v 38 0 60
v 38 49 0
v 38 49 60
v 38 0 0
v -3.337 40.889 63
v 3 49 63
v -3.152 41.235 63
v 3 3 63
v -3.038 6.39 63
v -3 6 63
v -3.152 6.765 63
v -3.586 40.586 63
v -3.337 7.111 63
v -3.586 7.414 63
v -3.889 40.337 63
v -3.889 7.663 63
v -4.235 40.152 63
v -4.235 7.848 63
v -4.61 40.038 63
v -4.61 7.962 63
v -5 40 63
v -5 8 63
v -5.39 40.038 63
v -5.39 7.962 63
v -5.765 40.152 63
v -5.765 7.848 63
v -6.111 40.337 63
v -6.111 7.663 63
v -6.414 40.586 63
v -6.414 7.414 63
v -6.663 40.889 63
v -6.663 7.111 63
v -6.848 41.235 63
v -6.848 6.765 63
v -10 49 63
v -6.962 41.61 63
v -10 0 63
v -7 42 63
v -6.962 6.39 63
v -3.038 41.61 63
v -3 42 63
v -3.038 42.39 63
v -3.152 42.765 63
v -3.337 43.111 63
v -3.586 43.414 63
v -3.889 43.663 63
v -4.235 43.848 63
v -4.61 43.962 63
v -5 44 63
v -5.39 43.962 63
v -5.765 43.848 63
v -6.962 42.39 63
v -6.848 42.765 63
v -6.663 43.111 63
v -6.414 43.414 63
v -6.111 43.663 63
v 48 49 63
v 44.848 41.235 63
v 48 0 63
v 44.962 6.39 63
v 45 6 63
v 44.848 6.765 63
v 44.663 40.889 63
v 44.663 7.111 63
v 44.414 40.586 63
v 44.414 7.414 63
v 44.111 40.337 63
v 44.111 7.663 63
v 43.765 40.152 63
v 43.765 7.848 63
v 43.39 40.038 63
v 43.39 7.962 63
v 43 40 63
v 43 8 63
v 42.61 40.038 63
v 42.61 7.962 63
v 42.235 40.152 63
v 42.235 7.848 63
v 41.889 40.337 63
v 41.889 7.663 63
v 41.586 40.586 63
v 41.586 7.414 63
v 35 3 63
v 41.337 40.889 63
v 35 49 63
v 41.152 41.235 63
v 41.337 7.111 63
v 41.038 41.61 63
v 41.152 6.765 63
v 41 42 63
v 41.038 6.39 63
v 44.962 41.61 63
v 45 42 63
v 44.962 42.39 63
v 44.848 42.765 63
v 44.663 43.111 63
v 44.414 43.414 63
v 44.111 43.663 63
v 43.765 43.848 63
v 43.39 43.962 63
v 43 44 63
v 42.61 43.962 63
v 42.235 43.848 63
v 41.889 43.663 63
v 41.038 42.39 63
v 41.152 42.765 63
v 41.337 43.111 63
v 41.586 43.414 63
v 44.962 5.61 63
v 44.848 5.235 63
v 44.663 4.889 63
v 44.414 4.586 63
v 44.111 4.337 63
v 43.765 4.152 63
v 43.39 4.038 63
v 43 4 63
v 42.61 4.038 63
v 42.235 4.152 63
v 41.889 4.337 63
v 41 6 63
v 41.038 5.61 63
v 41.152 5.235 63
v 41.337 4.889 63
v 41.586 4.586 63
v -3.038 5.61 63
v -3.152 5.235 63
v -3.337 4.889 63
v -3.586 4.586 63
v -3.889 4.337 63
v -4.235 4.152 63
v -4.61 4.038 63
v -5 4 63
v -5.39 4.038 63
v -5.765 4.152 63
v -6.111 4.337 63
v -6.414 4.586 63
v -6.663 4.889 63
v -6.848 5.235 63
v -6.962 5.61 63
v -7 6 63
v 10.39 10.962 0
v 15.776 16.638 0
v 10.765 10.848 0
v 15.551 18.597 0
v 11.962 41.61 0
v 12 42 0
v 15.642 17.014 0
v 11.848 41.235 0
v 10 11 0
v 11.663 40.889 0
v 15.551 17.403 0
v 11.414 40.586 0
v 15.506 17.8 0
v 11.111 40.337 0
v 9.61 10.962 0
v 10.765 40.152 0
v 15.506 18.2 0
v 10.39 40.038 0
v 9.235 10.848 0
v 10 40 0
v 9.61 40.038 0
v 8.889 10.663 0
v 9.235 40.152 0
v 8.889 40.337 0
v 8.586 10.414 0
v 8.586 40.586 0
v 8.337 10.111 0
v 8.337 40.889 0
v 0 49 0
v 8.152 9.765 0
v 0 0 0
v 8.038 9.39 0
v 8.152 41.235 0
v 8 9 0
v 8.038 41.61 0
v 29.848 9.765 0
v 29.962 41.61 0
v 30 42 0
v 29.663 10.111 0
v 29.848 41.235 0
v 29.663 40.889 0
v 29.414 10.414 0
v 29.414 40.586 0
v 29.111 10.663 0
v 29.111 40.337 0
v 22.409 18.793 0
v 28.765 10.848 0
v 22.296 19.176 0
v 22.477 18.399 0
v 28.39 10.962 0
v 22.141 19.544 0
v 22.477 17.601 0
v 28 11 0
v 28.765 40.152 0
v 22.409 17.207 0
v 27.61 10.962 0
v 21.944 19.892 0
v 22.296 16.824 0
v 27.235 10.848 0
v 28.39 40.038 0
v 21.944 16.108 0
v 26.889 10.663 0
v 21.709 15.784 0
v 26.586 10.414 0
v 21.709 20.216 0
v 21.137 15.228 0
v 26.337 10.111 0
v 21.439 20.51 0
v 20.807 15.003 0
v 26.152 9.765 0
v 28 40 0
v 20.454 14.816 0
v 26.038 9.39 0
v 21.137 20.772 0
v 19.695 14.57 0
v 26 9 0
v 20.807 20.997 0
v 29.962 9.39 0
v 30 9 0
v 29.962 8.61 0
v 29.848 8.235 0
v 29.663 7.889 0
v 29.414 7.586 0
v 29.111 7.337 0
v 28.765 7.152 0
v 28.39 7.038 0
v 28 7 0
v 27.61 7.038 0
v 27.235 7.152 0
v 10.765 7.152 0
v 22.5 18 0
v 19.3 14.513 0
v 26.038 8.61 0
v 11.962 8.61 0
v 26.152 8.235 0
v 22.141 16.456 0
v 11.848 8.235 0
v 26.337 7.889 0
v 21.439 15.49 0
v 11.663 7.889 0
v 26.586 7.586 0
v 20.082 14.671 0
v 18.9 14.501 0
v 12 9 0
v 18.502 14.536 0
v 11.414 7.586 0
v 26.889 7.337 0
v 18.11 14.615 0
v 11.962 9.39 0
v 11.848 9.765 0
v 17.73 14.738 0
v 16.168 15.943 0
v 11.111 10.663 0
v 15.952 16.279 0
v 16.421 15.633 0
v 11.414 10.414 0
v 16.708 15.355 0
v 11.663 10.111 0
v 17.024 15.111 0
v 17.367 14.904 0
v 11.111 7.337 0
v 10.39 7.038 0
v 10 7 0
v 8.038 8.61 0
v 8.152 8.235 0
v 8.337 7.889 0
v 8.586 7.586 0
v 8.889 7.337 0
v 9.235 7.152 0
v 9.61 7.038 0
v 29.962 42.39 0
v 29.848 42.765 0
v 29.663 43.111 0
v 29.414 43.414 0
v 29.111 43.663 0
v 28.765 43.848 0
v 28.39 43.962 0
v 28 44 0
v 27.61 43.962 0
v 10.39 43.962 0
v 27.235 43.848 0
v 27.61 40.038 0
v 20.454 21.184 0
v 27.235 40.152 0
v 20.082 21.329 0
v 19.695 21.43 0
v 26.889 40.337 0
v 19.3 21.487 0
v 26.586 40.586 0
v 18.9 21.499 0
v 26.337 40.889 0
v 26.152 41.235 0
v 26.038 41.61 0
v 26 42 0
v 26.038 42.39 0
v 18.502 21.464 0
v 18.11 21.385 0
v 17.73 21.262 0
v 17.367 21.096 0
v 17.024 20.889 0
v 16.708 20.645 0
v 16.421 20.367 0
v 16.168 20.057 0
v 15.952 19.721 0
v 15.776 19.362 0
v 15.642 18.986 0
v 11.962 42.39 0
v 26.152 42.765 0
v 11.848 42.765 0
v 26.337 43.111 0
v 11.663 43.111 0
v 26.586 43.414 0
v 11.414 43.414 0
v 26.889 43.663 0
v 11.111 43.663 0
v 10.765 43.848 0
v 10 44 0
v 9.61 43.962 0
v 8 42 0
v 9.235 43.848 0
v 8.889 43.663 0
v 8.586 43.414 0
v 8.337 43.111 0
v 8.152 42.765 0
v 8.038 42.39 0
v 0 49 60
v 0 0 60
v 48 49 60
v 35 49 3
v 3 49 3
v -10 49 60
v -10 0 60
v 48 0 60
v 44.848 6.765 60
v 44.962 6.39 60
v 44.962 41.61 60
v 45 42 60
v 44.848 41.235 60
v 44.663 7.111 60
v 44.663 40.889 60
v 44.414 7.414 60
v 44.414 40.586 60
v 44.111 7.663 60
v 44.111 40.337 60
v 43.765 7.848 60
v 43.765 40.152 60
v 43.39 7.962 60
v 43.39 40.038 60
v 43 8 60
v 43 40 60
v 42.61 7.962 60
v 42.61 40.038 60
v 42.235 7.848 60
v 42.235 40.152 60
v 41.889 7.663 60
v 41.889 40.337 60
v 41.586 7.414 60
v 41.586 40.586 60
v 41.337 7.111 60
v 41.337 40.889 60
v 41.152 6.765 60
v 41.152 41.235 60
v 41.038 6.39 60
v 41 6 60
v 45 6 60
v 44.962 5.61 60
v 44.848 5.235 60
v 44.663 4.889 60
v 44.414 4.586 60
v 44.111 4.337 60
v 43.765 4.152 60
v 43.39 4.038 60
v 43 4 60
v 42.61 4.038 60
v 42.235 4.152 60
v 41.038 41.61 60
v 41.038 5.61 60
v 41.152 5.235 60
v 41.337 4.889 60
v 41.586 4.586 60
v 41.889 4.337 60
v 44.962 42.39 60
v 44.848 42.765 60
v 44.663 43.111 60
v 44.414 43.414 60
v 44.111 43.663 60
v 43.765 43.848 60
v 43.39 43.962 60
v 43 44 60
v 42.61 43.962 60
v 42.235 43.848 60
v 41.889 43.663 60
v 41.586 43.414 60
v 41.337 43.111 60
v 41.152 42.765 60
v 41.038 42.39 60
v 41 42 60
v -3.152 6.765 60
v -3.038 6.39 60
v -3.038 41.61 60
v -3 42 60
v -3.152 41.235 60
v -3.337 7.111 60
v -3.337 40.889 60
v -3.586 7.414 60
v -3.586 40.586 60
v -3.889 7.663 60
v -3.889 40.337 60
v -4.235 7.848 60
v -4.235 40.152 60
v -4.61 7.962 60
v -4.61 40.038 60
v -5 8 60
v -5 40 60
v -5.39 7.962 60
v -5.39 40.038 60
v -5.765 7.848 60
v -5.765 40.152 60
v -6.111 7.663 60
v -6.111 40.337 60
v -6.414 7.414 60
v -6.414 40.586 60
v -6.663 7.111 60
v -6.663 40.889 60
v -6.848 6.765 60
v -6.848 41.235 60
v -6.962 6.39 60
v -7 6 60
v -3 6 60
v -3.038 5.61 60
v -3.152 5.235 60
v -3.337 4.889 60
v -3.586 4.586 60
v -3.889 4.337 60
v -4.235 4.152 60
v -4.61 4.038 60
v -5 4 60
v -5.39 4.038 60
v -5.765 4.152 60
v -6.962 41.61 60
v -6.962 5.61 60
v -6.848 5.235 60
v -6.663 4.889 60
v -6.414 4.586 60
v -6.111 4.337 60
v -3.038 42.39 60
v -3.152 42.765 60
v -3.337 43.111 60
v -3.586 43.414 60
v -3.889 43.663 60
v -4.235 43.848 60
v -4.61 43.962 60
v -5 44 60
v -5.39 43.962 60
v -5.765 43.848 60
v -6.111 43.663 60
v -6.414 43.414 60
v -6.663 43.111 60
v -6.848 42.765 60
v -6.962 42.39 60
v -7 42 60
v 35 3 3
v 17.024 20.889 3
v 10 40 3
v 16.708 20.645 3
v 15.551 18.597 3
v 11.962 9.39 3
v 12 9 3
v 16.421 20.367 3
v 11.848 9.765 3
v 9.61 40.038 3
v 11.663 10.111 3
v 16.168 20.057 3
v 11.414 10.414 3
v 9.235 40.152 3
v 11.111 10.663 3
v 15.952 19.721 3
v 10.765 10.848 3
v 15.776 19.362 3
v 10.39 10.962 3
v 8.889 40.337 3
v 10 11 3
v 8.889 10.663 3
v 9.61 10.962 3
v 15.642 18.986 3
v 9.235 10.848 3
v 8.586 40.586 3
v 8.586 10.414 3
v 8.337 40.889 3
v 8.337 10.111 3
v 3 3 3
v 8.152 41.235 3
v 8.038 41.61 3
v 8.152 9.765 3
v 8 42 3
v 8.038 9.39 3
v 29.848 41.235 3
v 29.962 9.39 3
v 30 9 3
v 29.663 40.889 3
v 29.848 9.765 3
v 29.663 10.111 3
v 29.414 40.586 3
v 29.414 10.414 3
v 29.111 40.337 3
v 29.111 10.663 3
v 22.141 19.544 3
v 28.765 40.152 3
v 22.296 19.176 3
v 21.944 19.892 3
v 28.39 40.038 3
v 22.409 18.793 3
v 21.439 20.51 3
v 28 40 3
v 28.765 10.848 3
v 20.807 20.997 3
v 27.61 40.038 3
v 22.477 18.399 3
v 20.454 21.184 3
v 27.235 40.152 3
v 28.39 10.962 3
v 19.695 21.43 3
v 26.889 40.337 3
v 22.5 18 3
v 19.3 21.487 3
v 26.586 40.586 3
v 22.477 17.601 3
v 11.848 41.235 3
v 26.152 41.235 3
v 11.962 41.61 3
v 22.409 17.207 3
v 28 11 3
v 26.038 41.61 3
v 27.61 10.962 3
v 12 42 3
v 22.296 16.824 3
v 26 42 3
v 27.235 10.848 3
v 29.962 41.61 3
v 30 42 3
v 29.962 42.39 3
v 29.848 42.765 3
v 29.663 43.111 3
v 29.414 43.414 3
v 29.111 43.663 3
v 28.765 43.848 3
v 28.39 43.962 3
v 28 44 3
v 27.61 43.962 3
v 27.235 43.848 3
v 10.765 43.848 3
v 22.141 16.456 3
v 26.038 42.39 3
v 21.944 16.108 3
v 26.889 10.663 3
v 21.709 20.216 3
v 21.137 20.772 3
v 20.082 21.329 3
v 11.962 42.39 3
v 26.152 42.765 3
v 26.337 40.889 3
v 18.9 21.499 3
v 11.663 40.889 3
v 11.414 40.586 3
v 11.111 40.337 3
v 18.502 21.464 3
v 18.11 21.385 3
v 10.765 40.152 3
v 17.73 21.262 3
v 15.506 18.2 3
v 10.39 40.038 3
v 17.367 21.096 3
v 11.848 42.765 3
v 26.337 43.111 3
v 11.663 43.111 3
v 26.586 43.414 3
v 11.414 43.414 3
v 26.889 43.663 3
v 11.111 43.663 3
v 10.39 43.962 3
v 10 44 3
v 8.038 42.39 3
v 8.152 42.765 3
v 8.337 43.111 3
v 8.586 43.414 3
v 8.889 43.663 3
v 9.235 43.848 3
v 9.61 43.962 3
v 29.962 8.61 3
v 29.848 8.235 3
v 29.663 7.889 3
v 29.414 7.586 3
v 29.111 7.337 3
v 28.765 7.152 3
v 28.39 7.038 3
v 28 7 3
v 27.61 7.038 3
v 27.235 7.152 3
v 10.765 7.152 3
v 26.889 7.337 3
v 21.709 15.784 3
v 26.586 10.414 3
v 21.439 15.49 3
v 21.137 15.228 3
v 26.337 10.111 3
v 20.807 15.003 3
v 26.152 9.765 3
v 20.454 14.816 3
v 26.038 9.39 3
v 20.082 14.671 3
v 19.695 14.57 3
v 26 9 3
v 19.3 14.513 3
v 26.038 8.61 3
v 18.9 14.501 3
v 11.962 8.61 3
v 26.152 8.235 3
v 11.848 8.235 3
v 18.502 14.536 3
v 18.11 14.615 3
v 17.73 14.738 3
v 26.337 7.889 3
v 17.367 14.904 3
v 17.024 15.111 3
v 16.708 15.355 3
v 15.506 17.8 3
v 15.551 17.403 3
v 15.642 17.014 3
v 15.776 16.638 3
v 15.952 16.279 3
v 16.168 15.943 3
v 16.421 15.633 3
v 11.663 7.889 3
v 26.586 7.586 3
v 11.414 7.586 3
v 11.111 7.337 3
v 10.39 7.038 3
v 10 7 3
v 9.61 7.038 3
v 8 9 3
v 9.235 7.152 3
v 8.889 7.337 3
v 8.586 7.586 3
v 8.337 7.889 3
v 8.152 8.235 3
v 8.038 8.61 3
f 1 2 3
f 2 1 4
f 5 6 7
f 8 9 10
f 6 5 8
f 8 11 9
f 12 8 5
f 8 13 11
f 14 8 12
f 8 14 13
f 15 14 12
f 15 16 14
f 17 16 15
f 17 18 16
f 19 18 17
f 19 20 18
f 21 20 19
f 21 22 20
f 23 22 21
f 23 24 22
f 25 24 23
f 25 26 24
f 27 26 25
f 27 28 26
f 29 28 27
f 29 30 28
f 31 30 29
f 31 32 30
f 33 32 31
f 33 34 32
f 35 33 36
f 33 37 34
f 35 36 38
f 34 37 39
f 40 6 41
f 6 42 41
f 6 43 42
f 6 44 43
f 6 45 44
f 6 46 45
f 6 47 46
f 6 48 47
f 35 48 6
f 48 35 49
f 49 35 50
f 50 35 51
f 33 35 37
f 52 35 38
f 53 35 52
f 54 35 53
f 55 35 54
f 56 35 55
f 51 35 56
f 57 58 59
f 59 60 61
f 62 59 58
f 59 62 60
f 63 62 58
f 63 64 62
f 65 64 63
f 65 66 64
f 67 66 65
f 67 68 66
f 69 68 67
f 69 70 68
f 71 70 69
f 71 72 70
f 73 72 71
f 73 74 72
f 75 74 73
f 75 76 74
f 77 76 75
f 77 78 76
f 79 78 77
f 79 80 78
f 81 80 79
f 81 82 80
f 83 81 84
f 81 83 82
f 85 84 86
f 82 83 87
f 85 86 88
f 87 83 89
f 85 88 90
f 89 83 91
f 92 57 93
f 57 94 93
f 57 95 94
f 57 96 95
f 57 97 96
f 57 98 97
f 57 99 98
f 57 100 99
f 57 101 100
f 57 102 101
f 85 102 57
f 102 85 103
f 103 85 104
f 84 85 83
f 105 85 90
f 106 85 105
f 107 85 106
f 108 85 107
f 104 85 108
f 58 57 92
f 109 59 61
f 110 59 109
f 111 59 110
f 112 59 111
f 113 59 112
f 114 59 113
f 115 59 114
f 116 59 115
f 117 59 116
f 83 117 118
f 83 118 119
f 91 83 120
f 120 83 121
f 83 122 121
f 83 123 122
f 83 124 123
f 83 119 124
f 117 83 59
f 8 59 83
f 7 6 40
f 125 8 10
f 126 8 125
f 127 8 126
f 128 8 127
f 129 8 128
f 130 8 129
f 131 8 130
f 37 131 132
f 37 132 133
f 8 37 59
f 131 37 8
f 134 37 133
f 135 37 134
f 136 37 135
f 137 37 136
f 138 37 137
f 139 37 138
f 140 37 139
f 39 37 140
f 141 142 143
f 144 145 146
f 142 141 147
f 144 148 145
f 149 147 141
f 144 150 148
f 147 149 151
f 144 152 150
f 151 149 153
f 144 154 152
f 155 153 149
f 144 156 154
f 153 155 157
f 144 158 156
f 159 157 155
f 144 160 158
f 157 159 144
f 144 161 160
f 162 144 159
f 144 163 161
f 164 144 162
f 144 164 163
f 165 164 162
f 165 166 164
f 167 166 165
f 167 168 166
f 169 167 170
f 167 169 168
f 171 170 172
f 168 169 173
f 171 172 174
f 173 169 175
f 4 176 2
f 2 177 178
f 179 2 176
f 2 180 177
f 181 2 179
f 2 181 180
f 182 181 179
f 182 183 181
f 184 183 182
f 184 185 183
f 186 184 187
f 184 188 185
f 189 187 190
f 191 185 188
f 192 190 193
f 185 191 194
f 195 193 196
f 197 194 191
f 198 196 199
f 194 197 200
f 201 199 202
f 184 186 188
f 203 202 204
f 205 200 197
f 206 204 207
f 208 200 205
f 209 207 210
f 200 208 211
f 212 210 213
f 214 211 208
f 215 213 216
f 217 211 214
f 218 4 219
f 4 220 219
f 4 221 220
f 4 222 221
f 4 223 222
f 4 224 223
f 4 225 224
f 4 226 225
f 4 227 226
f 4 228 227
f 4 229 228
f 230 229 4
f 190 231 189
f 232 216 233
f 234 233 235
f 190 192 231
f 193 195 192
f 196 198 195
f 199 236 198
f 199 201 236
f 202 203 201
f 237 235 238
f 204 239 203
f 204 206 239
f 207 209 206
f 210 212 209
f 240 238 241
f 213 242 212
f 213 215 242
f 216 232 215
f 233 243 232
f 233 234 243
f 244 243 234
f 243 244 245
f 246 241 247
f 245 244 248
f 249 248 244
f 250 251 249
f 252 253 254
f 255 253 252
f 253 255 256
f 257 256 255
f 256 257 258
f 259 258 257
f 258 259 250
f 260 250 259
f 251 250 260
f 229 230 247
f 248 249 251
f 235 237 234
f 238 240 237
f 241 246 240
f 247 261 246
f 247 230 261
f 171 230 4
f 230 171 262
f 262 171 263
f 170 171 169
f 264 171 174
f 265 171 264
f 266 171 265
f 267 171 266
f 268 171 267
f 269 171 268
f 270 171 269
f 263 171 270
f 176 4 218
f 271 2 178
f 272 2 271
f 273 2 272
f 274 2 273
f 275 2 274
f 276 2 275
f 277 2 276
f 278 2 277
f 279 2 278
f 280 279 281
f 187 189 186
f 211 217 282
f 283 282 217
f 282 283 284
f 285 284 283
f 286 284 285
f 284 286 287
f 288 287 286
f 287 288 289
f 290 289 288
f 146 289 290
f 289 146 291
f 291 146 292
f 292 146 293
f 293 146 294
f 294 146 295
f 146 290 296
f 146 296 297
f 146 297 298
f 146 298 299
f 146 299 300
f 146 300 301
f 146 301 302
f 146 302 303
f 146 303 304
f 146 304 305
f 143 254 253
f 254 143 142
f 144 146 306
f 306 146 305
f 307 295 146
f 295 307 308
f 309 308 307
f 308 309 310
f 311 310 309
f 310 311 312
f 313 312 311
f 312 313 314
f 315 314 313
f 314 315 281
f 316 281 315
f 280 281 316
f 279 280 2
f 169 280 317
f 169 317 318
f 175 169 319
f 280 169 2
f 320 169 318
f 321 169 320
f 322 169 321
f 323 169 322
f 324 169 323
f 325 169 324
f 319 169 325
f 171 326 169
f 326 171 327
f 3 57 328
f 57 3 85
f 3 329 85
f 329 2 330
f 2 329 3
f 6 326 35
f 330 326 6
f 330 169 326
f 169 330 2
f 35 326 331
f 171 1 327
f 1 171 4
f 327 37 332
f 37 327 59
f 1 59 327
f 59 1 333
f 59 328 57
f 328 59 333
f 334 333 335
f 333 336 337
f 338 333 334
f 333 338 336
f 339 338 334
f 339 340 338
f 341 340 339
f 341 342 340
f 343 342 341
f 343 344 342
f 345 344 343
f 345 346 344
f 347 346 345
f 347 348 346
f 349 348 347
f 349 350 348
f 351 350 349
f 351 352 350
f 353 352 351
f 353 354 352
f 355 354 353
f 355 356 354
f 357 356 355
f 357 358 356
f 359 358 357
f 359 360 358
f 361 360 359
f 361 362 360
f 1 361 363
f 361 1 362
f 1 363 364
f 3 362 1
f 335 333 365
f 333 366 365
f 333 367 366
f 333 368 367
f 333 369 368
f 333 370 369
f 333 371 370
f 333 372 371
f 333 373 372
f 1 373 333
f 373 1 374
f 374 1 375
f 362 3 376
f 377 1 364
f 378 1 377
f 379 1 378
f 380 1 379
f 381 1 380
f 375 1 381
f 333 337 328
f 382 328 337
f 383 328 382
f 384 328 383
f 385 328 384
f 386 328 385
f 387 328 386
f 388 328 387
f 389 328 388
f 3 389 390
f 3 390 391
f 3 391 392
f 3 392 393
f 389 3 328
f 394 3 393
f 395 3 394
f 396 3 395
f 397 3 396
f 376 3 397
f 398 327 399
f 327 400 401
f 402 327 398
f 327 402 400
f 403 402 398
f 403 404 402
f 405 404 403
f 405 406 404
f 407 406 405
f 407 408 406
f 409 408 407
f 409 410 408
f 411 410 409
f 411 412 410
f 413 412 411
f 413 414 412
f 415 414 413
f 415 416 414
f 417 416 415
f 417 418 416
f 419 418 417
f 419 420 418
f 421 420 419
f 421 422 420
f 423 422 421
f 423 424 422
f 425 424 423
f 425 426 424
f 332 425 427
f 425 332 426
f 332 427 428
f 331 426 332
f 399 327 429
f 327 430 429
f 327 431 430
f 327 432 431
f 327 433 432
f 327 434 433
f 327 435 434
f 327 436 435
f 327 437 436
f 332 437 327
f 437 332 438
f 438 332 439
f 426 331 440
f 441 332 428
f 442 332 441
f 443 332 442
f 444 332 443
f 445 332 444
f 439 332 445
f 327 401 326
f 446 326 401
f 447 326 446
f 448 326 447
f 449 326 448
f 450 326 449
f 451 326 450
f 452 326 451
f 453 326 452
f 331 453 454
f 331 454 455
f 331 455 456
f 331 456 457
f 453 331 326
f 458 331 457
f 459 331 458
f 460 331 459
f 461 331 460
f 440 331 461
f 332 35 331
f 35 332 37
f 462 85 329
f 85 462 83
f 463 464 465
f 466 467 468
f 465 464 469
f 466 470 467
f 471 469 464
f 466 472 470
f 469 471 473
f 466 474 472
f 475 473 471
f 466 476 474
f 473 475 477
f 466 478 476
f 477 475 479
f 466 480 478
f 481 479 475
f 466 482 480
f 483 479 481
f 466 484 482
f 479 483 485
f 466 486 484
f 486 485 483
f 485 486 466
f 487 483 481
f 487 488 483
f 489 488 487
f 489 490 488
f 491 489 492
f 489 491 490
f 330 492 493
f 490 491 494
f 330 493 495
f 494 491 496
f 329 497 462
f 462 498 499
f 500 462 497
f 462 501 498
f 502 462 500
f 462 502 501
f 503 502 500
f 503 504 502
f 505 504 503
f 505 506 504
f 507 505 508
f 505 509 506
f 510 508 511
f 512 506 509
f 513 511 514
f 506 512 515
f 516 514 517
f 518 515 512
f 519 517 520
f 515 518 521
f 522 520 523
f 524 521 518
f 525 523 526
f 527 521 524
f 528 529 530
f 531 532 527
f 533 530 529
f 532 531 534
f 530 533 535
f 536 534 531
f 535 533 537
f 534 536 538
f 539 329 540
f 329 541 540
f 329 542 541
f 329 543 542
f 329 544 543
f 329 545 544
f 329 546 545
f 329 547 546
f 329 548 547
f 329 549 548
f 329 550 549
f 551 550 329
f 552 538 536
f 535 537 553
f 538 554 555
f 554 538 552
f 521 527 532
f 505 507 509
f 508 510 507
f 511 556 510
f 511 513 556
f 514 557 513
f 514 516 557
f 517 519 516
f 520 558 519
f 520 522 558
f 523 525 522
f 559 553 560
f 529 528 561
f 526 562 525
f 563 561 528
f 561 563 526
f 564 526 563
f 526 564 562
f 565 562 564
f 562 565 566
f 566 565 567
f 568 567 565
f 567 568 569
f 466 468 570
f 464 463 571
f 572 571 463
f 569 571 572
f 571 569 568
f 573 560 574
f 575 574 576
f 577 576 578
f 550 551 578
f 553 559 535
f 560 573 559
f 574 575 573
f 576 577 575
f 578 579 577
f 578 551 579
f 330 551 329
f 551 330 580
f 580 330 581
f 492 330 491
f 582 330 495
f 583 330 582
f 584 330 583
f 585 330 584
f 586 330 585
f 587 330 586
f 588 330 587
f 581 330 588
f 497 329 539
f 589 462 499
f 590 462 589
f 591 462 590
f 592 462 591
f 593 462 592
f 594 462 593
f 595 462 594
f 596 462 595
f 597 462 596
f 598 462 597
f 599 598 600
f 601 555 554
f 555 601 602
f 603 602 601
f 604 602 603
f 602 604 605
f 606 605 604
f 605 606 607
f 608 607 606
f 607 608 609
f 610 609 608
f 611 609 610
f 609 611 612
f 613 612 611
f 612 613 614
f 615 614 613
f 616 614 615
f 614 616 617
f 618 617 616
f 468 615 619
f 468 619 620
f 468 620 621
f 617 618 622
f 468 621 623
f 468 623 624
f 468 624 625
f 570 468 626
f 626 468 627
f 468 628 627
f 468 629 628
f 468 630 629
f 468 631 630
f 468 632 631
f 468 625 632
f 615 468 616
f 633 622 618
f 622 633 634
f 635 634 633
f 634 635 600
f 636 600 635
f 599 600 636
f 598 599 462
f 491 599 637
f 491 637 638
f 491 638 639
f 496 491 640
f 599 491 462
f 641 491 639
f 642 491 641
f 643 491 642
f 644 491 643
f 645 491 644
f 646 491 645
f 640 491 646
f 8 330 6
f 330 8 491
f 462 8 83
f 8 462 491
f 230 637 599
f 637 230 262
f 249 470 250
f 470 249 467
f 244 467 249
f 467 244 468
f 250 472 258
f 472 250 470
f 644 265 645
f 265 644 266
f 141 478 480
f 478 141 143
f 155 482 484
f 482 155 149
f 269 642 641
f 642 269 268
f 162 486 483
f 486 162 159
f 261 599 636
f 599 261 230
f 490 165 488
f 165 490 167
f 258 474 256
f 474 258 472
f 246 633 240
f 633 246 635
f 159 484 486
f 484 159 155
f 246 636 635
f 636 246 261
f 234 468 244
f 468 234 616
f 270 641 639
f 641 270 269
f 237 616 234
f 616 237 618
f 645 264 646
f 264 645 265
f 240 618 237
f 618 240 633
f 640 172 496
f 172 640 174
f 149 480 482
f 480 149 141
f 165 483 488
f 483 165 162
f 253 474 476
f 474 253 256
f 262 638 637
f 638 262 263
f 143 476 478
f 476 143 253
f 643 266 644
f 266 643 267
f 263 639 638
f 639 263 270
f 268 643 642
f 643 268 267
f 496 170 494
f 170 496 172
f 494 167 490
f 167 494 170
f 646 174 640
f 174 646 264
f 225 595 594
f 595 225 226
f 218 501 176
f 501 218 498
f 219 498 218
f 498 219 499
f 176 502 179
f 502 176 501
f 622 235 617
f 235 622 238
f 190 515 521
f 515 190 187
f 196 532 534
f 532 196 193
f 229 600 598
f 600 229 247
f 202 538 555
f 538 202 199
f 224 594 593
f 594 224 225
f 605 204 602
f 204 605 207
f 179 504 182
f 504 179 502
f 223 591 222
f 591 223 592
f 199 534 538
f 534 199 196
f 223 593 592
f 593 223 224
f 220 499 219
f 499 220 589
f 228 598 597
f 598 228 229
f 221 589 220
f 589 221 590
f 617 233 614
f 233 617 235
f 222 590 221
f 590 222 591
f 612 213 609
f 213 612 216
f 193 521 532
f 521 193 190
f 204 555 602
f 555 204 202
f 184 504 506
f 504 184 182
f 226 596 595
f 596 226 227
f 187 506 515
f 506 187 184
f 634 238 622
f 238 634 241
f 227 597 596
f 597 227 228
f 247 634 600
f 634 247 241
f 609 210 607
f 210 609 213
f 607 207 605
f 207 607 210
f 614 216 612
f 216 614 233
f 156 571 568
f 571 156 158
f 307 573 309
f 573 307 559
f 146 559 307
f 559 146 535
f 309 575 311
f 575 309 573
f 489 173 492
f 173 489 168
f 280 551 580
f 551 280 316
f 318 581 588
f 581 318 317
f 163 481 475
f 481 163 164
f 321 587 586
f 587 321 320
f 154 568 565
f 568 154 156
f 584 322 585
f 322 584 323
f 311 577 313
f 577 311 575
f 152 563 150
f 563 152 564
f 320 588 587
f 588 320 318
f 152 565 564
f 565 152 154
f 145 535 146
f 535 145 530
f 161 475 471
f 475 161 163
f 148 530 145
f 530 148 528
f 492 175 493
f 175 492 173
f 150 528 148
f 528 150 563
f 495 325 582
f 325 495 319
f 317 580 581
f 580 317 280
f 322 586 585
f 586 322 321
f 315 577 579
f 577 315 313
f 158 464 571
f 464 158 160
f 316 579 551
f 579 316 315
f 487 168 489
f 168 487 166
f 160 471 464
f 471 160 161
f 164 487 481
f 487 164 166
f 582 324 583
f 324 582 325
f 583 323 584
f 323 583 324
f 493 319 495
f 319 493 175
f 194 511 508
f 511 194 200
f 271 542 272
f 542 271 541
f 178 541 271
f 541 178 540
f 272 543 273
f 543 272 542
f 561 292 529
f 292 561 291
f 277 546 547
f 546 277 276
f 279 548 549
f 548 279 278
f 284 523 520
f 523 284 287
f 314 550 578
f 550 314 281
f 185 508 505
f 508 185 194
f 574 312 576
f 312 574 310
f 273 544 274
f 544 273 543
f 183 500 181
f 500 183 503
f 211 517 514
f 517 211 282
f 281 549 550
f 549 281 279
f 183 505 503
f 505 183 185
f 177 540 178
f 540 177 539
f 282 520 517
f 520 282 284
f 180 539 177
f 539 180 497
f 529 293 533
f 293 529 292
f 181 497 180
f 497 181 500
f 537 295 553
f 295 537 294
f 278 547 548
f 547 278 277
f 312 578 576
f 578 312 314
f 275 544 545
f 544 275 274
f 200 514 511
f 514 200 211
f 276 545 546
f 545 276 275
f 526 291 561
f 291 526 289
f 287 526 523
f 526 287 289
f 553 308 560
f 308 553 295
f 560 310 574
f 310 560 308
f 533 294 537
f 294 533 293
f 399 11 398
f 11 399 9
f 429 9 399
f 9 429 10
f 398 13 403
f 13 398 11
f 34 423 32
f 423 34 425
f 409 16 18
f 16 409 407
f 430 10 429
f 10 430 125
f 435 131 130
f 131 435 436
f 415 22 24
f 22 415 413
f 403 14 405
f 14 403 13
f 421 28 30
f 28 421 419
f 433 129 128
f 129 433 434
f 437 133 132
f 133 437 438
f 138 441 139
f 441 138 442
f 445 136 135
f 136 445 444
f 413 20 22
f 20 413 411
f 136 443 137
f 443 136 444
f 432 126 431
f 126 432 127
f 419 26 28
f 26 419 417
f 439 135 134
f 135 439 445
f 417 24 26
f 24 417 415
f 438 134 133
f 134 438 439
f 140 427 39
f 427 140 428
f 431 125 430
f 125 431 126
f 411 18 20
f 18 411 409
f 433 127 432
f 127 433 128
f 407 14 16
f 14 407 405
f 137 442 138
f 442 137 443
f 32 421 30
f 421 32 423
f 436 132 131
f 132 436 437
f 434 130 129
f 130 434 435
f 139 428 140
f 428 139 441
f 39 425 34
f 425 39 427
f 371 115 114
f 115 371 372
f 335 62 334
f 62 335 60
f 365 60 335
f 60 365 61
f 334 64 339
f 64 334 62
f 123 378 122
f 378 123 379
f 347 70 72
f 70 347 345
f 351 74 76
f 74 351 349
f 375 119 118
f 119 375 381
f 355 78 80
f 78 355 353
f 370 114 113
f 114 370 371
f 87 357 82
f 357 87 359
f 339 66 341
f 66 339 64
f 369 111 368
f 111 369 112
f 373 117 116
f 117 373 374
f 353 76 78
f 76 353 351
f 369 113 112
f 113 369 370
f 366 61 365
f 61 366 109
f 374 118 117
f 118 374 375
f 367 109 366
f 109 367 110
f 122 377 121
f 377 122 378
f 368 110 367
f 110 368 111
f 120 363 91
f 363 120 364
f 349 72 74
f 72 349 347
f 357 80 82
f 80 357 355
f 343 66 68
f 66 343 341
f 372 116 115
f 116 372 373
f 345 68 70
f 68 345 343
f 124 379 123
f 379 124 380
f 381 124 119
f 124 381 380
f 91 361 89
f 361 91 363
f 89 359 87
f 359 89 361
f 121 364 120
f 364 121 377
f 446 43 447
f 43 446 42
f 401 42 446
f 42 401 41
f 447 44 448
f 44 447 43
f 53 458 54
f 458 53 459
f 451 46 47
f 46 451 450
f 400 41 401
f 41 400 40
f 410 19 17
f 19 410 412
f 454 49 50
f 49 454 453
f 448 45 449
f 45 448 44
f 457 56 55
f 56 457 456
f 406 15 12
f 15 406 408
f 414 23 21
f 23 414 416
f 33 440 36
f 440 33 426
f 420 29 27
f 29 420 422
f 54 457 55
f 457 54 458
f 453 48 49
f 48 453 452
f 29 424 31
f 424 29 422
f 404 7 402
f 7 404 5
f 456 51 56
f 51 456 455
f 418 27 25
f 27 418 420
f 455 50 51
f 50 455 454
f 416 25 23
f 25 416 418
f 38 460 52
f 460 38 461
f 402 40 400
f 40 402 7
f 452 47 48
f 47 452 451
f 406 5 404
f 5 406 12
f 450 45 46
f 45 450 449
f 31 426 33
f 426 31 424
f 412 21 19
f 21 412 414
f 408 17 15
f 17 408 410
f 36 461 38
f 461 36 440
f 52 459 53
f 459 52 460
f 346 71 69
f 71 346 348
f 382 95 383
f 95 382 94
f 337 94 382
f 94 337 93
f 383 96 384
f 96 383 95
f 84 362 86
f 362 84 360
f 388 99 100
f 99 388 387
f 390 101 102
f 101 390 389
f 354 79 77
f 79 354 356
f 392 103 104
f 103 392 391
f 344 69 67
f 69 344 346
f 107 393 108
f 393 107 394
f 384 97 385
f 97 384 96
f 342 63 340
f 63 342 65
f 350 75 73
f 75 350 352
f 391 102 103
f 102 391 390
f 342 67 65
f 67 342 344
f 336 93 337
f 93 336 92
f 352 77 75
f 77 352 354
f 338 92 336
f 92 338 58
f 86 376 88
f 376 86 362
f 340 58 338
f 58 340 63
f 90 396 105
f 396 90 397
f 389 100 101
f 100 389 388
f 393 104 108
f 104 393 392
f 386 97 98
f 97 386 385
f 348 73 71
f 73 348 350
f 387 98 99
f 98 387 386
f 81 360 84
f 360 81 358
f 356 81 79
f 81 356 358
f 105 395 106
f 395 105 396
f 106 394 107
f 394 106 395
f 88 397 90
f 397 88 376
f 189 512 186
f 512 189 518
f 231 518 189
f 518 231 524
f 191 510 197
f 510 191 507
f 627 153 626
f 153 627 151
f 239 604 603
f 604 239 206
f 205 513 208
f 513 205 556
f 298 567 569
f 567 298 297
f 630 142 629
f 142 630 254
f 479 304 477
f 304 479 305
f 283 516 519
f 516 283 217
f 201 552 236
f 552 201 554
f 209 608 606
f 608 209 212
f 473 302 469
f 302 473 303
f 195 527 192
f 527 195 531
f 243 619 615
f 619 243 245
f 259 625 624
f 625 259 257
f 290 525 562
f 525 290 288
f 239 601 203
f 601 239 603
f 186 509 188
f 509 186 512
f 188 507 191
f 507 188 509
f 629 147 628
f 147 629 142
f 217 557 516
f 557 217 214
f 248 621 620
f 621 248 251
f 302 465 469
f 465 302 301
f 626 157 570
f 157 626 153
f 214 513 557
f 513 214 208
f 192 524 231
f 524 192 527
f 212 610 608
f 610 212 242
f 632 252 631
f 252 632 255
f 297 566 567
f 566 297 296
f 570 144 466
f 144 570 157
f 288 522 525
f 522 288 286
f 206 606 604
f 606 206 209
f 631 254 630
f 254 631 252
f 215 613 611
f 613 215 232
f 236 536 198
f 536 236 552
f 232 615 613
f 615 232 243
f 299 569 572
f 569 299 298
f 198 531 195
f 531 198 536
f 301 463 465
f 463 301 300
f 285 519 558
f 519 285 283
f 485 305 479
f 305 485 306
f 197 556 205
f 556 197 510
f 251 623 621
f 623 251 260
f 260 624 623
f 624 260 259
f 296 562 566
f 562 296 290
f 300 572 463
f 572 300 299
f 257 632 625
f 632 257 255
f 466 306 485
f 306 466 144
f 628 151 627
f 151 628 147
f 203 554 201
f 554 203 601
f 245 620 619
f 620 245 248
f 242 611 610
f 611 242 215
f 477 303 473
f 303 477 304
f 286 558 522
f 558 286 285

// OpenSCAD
//bracket for holder 90 degree motor
$fa = 1;
$fs = 0.4;

motor_width = 32; //x
motor_length = 46; //y
motor_height = 60; //z

frame = 3;
tollerance = 1;

outer_bracket_width = motor_width + frame*2; //x
outer_bracket_length = motor_length + frame; //y
outer_bracket_height = motor_height + frame; //z

lip = 10;

module screw_hole(x,y,z){
    translate([x,y,z-1])
        cylinder(h=5, d=4);
}

difference(){
    union(){
        cube([outer_bracket_width, outer_bracket_length, outer_bracket_height]);

        translate([-lip, 0, outer_bracket_height-frame])
            cube([outer_bracket_width+lip*2, outer_bracket_length, frame]);
    }
    translate([frame, frame, frame])
        cube([motor_width, motor_length+tollerance, motor_height+tollerance]);

    //Holes for attacing motor
    screw_hole(7+frame, 6+frame, 0);
    screw_hole(25+frame, 6+frame, 0);
    screw_hole(7+frame, 39+frame, 0);
    screw_hole(25+frame, 39+frame, 0);
    
    //Holes for attacing bracket to project
    screw_hole(-5, 6, outer_bracket_height-frame);
    screw_hole(outer_bracket_width+5, 6, outer_bracket_height-frame);
    screw_hole(-5, 39+frame, outer_bracket_height-frame);
    screw_hole(outer_bracket_width+5, 39+frame, outer_bracket_height-frame);

    //Hole for motorpin
    translate([frame+motor_width/2, frame+15, -1])
        cylinder(h=5, d=7);

}
